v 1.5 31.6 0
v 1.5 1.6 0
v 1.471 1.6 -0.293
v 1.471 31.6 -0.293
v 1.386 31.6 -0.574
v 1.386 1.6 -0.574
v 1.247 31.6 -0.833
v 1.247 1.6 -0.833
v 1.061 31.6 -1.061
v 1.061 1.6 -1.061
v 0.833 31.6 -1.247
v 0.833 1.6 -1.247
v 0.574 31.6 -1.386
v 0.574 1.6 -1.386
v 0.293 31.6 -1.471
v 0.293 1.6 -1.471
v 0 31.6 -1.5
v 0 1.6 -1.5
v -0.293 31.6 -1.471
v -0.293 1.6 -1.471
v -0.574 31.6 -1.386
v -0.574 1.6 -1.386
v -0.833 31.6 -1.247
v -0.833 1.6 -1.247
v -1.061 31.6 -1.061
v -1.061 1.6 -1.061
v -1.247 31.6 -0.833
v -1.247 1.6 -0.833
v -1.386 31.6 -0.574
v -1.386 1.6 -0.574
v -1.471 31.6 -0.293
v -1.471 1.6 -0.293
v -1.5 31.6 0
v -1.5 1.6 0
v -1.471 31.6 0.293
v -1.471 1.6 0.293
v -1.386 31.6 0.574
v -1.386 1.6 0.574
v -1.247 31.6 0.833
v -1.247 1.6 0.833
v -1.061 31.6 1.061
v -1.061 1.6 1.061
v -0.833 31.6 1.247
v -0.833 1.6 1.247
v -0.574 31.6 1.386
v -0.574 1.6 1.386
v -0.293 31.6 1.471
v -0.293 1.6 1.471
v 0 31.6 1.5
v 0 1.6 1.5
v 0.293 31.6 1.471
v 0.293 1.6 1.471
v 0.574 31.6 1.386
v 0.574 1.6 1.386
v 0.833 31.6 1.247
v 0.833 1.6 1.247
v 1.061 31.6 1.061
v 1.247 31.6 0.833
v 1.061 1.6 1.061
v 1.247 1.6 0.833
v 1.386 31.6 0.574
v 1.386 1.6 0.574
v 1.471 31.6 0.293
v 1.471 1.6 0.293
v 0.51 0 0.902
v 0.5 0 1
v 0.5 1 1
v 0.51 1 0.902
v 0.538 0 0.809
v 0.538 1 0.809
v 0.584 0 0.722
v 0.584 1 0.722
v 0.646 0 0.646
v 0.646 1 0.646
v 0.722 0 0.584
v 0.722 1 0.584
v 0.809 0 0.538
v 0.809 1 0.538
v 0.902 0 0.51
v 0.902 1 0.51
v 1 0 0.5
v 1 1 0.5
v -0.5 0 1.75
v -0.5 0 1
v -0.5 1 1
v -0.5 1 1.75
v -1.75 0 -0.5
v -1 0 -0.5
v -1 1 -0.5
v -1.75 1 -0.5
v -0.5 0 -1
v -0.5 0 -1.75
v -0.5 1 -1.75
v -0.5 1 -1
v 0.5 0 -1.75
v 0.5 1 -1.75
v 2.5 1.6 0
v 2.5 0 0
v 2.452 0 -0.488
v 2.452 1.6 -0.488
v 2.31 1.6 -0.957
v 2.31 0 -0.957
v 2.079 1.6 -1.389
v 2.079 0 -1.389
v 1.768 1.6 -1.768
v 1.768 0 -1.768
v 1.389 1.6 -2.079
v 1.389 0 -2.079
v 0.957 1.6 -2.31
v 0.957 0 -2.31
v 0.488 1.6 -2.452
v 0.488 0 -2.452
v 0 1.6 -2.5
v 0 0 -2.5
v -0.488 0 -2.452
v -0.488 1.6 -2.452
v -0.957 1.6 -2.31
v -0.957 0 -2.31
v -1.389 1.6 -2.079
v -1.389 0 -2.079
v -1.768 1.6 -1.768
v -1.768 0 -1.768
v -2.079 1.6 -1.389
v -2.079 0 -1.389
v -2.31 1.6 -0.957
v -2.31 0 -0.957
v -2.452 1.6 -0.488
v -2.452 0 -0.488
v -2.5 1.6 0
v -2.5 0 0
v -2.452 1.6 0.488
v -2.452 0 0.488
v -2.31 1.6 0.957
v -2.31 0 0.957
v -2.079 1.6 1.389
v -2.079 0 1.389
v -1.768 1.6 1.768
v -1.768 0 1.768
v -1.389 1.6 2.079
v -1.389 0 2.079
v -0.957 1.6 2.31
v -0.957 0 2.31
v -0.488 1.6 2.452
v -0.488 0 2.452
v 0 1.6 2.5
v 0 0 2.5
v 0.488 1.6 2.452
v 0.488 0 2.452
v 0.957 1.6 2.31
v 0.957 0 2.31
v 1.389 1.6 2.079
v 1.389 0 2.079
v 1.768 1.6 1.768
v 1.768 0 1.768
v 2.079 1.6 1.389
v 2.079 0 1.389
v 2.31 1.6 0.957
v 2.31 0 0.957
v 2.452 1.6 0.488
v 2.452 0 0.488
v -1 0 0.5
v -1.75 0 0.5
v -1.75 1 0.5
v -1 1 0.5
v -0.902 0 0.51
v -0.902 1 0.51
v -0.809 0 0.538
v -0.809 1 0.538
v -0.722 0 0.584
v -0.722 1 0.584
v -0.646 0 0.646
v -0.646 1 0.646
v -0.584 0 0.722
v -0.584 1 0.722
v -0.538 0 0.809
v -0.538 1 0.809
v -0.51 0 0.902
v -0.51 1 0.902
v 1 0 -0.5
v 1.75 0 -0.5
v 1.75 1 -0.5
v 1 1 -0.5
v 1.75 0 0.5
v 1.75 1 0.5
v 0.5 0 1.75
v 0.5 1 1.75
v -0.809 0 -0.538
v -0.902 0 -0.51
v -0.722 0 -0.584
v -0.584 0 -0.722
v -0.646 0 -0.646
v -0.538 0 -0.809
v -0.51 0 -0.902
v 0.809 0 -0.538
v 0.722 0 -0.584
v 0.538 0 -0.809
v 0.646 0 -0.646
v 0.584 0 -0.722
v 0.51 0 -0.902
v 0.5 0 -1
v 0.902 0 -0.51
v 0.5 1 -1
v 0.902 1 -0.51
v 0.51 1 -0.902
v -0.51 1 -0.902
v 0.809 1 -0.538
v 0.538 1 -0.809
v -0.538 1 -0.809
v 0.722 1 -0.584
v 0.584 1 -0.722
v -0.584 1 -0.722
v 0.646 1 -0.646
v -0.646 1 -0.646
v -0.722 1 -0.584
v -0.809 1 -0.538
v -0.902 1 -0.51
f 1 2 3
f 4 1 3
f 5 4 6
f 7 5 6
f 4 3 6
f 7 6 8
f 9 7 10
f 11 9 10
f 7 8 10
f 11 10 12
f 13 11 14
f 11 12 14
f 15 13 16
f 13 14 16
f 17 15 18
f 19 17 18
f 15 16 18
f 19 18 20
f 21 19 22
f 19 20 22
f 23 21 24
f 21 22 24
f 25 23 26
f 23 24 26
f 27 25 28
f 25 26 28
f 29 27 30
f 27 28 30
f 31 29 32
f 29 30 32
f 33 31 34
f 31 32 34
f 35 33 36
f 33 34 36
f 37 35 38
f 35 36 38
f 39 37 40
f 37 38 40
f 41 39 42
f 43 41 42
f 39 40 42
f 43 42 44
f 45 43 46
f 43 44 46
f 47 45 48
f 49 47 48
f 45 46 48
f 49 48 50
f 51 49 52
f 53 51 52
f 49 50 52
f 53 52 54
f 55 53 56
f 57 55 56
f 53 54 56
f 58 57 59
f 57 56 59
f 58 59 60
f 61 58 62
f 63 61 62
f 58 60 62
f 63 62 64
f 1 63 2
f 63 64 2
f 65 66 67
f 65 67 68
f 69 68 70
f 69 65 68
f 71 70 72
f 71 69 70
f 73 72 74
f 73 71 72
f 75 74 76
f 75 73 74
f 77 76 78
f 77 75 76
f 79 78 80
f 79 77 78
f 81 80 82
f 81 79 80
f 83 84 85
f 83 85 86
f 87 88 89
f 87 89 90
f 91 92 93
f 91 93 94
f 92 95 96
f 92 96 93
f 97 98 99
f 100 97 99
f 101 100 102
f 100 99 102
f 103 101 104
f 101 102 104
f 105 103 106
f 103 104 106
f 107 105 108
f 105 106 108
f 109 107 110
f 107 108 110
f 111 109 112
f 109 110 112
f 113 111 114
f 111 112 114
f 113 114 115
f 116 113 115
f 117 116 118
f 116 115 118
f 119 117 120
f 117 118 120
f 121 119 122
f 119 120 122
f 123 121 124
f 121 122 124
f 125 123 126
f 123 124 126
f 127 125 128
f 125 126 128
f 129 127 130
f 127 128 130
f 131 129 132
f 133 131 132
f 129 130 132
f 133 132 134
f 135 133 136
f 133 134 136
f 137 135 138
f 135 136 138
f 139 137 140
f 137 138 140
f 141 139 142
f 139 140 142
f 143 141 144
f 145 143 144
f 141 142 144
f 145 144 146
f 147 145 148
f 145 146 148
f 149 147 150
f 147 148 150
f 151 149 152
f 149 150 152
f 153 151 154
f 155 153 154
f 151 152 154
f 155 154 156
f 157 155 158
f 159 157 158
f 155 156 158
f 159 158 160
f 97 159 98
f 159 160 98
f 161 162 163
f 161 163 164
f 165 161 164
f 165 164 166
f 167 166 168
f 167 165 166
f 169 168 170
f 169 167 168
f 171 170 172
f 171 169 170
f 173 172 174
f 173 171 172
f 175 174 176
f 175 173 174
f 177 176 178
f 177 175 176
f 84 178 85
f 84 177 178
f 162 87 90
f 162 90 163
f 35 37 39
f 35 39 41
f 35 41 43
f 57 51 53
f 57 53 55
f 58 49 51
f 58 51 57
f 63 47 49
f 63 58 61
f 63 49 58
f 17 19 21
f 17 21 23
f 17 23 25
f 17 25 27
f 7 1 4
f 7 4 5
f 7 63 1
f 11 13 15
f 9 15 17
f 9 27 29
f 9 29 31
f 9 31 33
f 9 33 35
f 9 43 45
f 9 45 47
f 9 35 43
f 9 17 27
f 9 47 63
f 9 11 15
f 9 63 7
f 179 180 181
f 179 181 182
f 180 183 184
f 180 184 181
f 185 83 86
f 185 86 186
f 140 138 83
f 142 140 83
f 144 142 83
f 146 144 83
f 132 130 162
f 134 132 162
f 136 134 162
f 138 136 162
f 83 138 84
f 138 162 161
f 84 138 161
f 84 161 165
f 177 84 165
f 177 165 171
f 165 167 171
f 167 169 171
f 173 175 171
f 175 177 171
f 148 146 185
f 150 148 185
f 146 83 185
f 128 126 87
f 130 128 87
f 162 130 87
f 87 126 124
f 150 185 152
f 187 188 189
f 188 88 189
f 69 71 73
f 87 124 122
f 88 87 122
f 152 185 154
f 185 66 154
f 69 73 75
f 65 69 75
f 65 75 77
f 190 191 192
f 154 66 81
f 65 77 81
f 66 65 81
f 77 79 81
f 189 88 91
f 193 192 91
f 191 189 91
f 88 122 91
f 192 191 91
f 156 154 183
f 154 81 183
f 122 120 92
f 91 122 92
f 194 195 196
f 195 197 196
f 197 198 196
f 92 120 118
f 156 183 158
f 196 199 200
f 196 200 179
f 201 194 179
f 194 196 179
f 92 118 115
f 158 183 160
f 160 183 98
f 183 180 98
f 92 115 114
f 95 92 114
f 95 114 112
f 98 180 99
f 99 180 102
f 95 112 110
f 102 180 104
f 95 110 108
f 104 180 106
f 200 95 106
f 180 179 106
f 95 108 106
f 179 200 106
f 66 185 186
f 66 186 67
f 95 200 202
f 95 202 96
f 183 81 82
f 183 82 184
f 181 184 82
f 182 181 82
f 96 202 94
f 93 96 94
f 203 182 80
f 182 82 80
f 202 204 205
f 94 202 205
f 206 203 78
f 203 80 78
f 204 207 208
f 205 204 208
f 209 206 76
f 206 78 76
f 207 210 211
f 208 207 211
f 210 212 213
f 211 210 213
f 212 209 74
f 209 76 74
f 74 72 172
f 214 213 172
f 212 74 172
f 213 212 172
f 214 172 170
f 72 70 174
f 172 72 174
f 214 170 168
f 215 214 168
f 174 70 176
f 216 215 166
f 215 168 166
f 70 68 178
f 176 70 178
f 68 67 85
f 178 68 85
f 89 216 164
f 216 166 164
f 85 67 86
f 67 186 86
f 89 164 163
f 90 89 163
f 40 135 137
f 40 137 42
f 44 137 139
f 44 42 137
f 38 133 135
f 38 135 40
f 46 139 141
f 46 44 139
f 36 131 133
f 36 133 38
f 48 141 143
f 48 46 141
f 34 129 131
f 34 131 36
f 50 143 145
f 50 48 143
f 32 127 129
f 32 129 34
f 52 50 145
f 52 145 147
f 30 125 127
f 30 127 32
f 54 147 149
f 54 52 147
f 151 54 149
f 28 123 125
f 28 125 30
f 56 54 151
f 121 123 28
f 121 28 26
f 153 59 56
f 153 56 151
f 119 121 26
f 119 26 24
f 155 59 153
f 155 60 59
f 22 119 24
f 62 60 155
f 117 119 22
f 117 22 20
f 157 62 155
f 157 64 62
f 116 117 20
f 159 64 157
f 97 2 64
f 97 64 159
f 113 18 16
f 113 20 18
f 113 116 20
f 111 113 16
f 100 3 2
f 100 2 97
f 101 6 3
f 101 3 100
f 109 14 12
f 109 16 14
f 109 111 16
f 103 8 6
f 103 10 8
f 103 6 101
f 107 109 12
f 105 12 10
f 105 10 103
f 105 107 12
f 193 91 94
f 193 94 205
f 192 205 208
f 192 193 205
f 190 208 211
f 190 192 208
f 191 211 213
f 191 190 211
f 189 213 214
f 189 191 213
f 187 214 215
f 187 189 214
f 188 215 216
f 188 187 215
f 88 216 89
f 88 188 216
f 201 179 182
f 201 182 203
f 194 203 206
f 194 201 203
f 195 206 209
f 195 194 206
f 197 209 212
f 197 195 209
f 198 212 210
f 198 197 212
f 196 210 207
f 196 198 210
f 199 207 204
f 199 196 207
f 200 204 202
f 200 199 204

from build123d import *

# Parameters (mm, degrees)
SKETCH_1_R          = 2.5
EXTRUDE_1_DEPTH     = 1.6
SKETCH_2_R          = 1.5
EXTRUDE_2_DEPTH     = 30
CUT_EXTRUDE_1_DEPTH = 1


with BuildPart() as part:
    # 草图1 → 凸台-拉伸1 (new body)
    with BuildSketch(Plane(origin=(0, 0, 0), x_dir=(1, 0, 0), z_dir=(0, 1, 0))):
        Circle(SKETCH_1_R)
    extrude(amount=EXTRUDE_1_DEPTH)

    # 草图2 → 凸台-拉伸2 (add)
    with BuildSketch(Plane(origin=(0, 1.6, 0), x_dir=(1, 0, 0), z_dir=(0, 1, 0))):
        Circle(SKETCH_2_R)
    extrude(amount=EXTRUDE_2_DEPTH)

    # 草图3 → 切除-拉伸1 (cut)
    with BuildSketch(Plane.XZ):
        with BuildLine():
            Line((-0.5, 1), (-0.5, 1.75))
            Line((-0.5, 1.75), (0.5, 1.75))
            Line((0.5, 1.75), (0.5, 1))
            ThreePointArc((0.5, 1), (0.646446609, 0.646446609), (1, 0.5))
            Line((1, 0.5), (1.75, 0.5))
            Line((1.75, 0.5), (1.75, -0.5))
            Line((1.75, -0.5), (1, -0.5))
            ThreePointArc((1, -0.5), (0.646446609, -0.646446609), (0.5, -1))
            Line((0.5, -1), (0.5, -1.75))
            Line((0.5, -1.75), (-0.5, -1.75))
            Line((-0.5, -1.75), (-0.5, -1))
            ThreePointArc((-0.5, -1), (-0.646446609, -0.646446609), (-1, -0.5))
            Line((-1, -0.5), (-1.75, -0.5))
            Line((-1.75, -0.5), (-1.75, 0.5))
            Line((-1.75, 0.5), (-1, 0.5))
            ThreePointArc((-1, 0.5), (-0.646446609, 0.646446609), (-0.5, 1))
        make_face()
    extrude(amount=-CUT_EXTRUDE_1_DEPTH, mode=Mode.SUBTRACT)


solid = part.part
